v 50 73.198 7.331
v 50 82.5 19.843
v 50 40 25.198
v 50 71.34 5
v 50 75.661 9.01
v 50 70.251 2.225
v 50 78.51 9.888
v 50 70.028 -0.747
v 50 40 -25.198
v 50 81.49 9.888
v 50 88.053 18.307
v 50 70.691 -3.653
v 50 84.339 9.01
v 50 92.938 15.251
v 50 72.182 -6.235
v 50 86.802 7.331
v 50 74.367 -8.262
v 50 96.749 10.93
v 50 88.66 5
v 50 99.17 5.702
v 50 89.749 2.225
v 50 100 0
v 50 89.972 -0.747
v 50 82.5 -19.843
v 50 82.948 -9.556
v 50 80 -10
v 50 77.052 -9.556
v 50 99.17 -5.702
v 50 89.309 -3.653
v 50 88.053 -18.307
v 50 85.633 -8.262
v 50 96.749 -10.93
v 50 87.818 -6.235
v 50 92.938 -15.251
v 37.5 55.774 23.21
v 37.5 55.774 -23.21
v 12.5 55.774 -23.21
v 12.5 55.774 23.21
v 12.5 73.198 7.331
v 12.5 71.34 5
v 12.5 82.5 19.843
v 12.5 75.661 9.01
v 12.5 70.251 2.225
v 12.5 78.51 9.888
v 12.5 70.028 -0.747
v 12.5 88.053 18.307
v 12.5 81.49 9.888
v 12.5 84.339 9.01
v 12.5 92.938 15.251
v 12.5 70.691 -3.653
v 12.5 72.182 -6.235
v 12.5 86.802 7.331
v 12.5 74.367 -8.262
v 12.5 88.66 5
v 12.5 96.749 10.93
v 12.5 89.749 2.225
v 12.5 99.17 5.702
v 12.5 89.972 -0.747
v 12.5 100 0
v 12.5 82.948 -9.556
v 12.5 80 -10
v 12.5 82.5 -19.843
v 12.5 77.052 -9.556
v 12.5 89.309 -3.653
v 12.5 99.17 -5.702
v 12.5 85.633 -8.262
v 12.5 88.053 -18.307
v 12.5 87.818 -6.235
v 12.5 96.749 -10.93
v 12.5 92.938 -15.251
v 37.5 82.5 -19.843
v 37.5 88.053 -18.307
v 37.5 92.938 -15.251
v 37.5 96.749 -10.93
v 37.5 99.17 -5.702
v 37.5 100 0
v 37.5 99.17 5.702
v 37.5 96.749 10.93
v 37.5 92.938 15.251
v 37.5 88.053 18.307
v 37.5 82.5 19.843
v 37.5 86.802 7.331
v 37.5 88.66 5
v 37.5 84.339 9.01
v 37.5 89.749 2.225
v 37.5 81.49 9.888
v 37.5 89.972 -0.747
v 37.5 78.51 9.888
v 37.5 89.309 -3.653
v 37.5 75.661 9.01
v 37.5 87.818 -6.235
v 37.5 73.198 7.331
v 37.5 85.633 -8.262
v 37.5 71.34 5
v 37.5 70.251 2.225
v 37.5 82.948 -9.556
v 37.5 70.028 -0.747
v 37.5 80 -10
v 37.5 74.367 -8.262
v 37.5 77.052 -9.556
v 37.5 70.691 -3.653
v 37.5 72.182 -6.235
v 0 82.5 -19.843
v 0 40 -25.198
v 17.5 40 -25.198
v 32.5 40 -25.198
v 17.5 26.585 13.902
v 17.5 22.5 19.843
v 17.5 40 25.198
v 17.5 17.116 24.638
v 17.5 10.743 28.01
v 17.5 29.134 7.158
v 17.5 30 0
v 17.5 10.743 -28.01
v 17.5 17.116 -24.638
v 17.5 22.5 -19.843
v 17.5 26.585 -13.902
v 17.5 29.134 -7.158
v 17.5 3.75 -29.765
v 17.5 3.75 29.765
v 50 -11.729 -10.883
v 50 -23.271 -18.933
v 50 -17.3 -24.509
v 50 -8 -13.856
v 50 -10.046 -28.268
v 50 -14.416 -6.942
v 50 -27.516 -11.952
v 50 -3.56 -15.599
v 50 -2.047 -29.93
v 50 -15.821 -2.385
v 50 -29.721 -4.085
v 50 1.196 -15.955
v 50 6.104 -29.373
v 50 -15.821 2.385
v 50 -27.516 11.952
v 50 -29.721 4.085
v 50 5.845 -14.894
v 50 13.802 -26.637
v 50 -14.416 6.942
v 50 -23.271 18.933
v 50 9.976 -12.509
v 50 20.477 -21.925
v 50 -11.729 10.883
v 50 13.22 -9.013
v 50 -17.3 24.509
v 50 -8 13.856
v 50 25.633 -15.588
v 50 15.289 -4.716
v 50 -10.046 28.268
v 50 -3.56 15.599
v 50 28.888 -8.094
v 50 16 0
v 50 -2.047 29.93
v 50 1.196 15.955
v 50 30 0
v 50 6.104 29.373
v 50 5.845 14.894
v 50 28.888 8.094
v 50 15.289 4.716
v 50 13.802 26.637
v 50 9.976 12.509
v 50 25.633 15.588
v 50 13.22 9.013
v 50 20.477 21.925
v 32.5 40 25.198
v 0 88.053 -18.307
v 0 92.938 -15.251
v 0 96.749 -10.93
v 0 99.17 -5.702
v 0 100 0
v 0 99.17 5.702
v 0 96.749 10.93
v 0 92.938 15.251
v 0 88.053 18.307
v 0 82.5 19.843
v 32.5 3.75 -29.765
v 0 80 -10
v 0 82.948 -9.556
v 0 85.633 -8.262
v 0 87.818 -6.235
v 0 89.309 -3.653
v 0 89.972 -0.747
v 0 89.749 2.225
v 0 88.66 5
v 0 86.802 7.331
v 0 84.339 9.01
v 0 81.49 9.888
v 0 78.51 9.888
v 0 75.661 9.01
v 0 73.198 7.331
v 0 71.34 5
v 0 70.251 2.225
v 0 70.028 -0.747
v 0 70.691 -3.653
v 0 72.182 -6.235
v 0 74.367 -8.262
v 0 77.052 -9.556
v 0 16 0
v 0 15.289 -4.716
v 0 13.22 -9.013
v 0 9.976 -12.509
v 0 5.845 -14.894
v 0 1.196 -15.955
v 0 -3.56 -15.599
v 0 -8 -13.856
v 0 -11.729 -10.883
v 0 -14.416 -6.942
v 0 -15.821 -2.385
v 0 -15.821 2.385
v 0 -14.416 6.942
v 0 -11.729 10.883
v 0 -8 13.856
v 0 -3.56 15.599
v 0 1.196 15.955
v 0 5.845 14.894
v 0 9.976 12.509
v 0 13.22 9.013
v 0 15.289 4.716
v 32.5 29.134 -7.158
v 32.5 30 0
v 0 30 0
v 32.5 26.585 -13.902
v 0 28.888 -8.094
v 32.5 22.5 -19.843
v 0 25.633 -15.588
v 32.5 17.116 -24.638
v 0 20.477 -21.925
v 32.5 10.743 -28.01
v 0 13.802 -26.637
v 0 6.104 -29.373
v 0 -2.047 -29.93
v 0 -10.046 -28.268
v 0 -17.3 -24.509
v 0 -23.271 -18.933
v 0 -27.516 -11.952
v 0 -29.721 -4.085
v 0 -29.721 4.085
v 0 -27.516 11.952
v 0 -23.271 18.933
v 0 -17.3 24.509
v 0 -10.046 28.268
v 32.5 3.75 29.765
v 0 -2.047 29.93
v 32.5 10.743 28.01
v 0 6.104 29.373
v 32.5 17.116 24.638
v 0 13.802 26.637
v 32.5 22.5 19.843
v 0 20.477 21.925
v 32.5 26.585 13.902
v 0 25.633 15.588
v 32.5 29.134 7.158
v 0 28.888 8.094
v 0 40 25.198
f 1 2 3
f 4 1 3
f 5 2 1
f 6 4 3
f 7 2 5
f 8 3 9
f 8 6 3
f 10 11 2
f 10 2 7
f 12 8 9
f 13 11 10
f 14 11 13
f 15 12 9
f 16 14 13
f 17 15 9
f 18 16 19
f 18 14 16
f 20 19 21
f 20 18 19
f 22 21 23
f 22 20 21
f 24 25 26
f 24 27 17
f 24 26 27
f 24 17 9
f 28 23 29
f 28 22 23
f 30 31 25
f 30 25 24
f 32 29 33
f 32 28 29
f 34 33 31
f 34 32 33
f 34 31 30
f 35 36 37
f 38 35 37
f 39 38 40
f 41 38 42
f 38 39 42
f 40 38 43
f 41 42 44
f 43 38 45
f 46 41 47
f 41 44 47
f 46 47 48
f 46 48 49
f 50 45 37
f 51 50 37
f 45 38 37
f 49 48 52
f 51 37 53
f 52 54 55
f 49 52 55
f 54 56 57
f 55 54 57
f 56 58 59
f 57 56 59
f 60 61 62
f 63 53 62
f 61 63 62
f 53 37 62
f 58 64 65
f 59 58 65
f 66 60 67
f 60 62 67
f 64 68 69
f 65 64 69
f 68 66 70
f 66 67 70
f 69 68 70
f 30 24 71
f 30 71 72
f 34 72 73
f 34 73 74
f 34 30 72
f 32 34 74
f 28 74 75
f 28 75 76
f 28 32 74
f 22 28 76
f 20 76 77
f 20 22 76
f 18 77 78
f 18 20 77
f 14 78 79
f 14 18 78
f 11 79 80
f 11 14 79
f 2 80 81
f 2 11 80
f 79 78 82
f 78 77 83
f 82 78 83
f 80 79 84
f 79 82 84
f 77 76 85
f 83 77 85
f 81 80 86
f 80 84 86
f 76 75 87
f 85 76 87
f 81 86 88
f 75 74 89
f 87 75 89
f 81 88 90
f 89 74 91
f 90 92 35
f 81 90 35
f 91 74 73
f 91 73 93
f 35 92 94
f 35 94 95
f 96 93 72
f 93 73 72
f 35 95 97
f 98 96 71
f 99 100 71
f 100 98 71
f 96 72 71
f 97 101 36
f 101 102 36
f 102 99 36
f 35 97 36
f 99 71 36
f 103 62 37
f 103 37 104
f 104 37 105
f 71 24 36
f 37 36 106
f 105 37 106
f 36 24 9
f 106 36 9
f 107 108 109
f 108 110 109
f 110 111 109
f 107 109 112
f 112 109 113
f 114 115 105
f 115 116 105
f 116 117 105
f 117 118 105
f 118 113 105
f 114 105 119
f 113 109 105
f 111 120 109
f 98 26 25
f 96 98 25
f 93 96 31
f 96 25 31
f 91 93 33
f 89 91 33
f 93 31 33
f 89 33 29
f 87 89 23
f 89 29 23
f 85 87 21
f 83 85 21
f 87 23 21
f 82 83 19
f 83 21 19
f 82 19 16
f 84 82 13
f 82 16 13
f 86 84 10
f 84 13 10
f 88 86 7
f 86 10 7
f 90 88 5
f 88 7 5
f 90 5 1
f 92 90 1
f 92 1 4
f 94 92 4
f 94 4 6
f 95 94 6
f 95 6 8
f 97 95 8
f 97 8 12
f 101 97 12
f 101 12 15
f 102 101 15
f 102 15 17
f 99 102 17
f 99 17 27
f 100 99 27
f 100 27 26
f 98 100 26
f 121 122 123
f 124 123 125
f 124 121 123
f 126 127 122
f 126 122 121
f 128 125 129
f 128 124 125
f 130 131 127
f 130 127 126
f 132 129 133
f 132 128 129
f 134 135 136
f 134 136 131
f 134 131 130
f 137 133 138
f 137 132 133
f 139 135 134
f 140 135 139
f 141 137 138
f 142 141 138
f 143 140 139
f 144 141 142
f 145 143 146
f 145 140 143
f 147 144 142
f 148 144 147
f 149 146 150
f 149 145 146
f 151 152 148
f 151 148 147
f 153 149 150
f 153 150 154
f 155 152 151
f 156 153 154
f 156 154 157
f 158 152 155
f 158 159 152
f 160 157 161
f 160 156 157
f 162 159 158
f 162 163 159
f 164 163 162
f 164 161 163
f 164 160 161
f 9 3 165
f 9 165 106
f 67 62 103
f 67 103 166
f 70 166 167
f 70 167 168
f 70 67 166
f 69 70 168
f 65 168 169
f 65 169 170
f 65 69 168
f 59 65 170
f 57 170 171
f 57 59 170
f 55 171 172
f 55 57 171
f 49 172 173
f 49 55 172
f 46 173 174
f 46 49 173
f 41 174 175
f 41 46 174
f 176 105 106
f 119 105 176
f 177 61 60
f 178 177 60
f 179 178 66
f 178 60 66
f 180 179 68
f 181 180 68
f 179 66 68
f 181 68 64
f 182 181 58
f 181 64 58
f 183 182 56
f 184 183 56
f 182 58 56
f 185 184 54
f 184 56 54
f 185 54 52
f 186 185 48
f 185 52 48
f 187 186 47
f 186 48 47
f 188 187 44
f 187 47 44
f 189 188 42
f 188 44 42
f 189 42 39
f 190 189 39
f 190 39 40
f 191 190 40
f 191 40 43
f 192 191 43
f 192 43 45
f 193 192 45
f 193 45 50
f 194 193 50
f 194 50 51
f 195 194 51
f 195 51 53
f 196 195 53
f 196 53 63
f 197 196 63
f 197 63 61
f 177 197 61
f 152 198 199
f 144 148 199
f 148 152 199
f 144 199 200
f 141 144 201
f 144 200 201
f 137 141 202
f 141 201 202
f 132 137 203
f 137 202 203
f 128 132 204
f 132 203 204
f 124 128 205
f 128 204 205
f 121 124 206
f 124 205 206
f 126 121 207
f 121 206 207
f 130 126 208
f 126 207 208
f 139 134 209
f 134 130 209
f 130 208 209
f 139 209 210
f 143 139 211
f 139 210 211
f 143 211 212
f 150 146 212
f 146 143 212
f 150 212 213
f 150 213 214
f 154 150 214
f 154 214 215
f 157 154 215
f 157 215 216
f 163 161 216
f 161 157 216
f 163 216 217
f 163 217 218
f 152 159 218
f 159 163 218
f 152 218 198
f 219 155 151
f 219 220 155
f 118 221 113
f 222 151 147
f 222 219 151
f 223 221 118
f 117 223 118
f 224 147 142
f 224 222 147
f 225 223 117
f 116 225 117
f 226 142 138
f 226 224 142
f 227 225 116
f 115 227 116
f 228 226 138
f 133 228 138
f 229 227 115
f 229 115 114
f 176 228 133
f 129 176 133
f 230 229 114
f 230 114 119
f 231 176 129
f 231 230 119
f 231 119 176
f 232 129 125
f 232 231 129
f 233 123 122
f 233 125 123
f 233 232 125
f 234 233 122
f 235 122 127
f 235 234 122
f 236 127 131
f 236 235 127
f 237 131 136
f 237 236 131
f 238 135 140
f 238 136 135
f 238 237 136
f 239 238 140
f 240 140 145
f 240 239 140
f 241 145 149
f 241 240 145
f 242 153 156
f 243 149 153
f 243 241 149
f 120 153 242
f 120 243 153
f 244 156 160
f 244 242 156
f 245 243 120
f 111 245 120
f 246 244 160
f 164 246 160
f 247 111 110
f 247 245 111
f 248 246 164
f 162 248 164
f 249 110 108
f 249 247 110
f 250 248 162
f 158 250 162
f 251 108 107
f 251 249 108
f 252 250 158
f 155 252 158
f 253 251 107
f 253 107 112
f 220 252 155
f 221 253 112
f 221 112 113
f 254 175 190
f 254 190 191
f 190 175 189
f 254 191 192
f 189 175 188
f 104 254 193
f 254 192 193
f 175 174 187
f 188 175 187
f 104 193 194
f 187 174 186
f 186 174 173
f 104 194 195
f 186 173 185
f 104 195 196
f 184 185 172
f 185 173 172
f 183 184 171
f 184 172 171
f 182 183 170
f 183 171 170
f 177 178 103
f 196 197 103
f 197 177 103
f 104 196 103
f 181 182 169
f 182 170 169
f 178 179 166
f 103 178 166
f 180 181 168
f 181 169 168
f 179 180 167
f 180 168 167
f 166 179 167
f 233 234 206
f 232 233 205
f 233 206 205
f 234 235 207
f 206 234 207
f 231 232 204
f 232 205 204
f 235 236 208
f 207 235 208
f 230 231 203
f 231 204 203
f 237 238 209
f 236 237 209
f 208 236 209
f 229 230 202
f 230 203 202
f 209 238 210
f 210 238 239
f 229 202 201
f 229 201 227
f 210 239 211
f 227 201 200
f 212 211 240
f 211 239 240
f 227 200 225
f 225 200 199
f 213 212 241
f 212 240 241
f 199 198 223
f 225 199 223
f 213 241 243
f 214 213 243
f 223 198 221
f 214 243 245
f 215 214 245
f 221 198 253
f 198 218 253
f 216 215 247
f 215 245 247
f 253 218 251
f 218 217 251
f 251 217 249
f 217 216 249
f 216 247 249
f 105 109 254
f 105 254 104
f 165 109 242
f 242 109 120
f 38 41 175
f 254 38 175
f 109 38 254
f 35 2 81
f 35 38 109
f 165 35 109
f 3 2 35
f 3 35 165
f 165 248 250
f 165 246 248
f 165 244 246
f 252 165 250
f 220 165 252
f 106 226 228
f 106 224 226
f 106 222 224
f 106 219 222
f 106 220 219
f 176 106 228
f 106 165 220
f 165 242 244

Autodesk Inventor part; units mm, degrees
ref_plane "YZ Plane" through (0, 0, 0) normal (1, 0, 0) x (0, 1, 0)
ref_plane "XZ Plane" through (0, 0, 0) normal (0, 1, 0) x (-1, 0, 0)
sketch "Sketch1" plane through (0, 0, 0) normal (1, 0, 0) x (0, 1, 0)
  circle A0 centre (0, 0) radius 30
  circle A1 centre (0, 0) radius 16
  dimension "d0" = 60
  dimension "d1" = 32
extrude "Extrusion1" add sketch "Sketch1" along normal blind 50
sketch "Sketch2" plane through (50, 0, 0) normal (1, 0, 0) x (0, 0, -1)
  circle A0 centre (0, 80) radius 10
  circle A1 centre (0, 80) radius 20
  line L0 (-19.8431, 82.5) -> (-29.7647, 3.75)
  line L1 (19.8431, 82.5) -> (29.7647, 3.75)
  circle A2 centre (0, 0) radius 30 projected
  line L2 (-25.1976, 40) -> (25.1976, 40)
  dimension "d4" = 20
  dimension "d5" = 40
  dimension "d6" = 80
  dimension "d7" = 40
extrude "Extrusion2" add sketch "Sketch2" against normal blind 50 contours A1 | A1 L1 L2 L0
sketch "Sketch3" plane through (0, 0, 0) normal (0, 0, 1) x (1, 0, 0)
  line L0 (12.5, 115.7738) -> (37.5, 115.7738)
  line L1 (37.5, 115.7738) -> (37.5, 55.7738)
  line L2 (37.5, 55.7738) -> (12.5, 55.7738)
  line L3 (12.5, 55.7738) -> (12.5, 115.7738)
  line L4 (0, 100) -> (0, 82.5) projected
  line L5 (0, 70) -> (0, 90) projected
  line L6 (50, 90) -> (50, 70) projected
  line L7 (0, 80.7738) -> (50, 80.7738)
  point P0 (0, 0)
  dimension "d10" = 12.5
  dimension "d11" = 25
  dimension "d12" = 25
  dimension "d13" = 60
extrude "Extrusion3" cut sketch "Sketch3" along normal through all both and the other way through all
ref_plane "Work Plane1" through (25, 0, 0) normal (1, 0, 0) x (0, 0, -1)
sketch "Sketch4" plane through (25, 0, 0) normal (1, 0, 0) x (0, 0, -1)
  line L0 (25.1976, 40) -> (29.7647, 3.75)
  line L1 (-25.1976, 40) -> (-29.7647, 3.75)
  circle A0 centre (0, 0) radius 30 projected
  line L2 (25.1976, 40) -> (-25.1976, 40) projected
extrude "Extrusion4" add sketch "Sketch4" along normal mid plane 15 contours L0 A0 L1 L2
properties part number "Exercise04"
